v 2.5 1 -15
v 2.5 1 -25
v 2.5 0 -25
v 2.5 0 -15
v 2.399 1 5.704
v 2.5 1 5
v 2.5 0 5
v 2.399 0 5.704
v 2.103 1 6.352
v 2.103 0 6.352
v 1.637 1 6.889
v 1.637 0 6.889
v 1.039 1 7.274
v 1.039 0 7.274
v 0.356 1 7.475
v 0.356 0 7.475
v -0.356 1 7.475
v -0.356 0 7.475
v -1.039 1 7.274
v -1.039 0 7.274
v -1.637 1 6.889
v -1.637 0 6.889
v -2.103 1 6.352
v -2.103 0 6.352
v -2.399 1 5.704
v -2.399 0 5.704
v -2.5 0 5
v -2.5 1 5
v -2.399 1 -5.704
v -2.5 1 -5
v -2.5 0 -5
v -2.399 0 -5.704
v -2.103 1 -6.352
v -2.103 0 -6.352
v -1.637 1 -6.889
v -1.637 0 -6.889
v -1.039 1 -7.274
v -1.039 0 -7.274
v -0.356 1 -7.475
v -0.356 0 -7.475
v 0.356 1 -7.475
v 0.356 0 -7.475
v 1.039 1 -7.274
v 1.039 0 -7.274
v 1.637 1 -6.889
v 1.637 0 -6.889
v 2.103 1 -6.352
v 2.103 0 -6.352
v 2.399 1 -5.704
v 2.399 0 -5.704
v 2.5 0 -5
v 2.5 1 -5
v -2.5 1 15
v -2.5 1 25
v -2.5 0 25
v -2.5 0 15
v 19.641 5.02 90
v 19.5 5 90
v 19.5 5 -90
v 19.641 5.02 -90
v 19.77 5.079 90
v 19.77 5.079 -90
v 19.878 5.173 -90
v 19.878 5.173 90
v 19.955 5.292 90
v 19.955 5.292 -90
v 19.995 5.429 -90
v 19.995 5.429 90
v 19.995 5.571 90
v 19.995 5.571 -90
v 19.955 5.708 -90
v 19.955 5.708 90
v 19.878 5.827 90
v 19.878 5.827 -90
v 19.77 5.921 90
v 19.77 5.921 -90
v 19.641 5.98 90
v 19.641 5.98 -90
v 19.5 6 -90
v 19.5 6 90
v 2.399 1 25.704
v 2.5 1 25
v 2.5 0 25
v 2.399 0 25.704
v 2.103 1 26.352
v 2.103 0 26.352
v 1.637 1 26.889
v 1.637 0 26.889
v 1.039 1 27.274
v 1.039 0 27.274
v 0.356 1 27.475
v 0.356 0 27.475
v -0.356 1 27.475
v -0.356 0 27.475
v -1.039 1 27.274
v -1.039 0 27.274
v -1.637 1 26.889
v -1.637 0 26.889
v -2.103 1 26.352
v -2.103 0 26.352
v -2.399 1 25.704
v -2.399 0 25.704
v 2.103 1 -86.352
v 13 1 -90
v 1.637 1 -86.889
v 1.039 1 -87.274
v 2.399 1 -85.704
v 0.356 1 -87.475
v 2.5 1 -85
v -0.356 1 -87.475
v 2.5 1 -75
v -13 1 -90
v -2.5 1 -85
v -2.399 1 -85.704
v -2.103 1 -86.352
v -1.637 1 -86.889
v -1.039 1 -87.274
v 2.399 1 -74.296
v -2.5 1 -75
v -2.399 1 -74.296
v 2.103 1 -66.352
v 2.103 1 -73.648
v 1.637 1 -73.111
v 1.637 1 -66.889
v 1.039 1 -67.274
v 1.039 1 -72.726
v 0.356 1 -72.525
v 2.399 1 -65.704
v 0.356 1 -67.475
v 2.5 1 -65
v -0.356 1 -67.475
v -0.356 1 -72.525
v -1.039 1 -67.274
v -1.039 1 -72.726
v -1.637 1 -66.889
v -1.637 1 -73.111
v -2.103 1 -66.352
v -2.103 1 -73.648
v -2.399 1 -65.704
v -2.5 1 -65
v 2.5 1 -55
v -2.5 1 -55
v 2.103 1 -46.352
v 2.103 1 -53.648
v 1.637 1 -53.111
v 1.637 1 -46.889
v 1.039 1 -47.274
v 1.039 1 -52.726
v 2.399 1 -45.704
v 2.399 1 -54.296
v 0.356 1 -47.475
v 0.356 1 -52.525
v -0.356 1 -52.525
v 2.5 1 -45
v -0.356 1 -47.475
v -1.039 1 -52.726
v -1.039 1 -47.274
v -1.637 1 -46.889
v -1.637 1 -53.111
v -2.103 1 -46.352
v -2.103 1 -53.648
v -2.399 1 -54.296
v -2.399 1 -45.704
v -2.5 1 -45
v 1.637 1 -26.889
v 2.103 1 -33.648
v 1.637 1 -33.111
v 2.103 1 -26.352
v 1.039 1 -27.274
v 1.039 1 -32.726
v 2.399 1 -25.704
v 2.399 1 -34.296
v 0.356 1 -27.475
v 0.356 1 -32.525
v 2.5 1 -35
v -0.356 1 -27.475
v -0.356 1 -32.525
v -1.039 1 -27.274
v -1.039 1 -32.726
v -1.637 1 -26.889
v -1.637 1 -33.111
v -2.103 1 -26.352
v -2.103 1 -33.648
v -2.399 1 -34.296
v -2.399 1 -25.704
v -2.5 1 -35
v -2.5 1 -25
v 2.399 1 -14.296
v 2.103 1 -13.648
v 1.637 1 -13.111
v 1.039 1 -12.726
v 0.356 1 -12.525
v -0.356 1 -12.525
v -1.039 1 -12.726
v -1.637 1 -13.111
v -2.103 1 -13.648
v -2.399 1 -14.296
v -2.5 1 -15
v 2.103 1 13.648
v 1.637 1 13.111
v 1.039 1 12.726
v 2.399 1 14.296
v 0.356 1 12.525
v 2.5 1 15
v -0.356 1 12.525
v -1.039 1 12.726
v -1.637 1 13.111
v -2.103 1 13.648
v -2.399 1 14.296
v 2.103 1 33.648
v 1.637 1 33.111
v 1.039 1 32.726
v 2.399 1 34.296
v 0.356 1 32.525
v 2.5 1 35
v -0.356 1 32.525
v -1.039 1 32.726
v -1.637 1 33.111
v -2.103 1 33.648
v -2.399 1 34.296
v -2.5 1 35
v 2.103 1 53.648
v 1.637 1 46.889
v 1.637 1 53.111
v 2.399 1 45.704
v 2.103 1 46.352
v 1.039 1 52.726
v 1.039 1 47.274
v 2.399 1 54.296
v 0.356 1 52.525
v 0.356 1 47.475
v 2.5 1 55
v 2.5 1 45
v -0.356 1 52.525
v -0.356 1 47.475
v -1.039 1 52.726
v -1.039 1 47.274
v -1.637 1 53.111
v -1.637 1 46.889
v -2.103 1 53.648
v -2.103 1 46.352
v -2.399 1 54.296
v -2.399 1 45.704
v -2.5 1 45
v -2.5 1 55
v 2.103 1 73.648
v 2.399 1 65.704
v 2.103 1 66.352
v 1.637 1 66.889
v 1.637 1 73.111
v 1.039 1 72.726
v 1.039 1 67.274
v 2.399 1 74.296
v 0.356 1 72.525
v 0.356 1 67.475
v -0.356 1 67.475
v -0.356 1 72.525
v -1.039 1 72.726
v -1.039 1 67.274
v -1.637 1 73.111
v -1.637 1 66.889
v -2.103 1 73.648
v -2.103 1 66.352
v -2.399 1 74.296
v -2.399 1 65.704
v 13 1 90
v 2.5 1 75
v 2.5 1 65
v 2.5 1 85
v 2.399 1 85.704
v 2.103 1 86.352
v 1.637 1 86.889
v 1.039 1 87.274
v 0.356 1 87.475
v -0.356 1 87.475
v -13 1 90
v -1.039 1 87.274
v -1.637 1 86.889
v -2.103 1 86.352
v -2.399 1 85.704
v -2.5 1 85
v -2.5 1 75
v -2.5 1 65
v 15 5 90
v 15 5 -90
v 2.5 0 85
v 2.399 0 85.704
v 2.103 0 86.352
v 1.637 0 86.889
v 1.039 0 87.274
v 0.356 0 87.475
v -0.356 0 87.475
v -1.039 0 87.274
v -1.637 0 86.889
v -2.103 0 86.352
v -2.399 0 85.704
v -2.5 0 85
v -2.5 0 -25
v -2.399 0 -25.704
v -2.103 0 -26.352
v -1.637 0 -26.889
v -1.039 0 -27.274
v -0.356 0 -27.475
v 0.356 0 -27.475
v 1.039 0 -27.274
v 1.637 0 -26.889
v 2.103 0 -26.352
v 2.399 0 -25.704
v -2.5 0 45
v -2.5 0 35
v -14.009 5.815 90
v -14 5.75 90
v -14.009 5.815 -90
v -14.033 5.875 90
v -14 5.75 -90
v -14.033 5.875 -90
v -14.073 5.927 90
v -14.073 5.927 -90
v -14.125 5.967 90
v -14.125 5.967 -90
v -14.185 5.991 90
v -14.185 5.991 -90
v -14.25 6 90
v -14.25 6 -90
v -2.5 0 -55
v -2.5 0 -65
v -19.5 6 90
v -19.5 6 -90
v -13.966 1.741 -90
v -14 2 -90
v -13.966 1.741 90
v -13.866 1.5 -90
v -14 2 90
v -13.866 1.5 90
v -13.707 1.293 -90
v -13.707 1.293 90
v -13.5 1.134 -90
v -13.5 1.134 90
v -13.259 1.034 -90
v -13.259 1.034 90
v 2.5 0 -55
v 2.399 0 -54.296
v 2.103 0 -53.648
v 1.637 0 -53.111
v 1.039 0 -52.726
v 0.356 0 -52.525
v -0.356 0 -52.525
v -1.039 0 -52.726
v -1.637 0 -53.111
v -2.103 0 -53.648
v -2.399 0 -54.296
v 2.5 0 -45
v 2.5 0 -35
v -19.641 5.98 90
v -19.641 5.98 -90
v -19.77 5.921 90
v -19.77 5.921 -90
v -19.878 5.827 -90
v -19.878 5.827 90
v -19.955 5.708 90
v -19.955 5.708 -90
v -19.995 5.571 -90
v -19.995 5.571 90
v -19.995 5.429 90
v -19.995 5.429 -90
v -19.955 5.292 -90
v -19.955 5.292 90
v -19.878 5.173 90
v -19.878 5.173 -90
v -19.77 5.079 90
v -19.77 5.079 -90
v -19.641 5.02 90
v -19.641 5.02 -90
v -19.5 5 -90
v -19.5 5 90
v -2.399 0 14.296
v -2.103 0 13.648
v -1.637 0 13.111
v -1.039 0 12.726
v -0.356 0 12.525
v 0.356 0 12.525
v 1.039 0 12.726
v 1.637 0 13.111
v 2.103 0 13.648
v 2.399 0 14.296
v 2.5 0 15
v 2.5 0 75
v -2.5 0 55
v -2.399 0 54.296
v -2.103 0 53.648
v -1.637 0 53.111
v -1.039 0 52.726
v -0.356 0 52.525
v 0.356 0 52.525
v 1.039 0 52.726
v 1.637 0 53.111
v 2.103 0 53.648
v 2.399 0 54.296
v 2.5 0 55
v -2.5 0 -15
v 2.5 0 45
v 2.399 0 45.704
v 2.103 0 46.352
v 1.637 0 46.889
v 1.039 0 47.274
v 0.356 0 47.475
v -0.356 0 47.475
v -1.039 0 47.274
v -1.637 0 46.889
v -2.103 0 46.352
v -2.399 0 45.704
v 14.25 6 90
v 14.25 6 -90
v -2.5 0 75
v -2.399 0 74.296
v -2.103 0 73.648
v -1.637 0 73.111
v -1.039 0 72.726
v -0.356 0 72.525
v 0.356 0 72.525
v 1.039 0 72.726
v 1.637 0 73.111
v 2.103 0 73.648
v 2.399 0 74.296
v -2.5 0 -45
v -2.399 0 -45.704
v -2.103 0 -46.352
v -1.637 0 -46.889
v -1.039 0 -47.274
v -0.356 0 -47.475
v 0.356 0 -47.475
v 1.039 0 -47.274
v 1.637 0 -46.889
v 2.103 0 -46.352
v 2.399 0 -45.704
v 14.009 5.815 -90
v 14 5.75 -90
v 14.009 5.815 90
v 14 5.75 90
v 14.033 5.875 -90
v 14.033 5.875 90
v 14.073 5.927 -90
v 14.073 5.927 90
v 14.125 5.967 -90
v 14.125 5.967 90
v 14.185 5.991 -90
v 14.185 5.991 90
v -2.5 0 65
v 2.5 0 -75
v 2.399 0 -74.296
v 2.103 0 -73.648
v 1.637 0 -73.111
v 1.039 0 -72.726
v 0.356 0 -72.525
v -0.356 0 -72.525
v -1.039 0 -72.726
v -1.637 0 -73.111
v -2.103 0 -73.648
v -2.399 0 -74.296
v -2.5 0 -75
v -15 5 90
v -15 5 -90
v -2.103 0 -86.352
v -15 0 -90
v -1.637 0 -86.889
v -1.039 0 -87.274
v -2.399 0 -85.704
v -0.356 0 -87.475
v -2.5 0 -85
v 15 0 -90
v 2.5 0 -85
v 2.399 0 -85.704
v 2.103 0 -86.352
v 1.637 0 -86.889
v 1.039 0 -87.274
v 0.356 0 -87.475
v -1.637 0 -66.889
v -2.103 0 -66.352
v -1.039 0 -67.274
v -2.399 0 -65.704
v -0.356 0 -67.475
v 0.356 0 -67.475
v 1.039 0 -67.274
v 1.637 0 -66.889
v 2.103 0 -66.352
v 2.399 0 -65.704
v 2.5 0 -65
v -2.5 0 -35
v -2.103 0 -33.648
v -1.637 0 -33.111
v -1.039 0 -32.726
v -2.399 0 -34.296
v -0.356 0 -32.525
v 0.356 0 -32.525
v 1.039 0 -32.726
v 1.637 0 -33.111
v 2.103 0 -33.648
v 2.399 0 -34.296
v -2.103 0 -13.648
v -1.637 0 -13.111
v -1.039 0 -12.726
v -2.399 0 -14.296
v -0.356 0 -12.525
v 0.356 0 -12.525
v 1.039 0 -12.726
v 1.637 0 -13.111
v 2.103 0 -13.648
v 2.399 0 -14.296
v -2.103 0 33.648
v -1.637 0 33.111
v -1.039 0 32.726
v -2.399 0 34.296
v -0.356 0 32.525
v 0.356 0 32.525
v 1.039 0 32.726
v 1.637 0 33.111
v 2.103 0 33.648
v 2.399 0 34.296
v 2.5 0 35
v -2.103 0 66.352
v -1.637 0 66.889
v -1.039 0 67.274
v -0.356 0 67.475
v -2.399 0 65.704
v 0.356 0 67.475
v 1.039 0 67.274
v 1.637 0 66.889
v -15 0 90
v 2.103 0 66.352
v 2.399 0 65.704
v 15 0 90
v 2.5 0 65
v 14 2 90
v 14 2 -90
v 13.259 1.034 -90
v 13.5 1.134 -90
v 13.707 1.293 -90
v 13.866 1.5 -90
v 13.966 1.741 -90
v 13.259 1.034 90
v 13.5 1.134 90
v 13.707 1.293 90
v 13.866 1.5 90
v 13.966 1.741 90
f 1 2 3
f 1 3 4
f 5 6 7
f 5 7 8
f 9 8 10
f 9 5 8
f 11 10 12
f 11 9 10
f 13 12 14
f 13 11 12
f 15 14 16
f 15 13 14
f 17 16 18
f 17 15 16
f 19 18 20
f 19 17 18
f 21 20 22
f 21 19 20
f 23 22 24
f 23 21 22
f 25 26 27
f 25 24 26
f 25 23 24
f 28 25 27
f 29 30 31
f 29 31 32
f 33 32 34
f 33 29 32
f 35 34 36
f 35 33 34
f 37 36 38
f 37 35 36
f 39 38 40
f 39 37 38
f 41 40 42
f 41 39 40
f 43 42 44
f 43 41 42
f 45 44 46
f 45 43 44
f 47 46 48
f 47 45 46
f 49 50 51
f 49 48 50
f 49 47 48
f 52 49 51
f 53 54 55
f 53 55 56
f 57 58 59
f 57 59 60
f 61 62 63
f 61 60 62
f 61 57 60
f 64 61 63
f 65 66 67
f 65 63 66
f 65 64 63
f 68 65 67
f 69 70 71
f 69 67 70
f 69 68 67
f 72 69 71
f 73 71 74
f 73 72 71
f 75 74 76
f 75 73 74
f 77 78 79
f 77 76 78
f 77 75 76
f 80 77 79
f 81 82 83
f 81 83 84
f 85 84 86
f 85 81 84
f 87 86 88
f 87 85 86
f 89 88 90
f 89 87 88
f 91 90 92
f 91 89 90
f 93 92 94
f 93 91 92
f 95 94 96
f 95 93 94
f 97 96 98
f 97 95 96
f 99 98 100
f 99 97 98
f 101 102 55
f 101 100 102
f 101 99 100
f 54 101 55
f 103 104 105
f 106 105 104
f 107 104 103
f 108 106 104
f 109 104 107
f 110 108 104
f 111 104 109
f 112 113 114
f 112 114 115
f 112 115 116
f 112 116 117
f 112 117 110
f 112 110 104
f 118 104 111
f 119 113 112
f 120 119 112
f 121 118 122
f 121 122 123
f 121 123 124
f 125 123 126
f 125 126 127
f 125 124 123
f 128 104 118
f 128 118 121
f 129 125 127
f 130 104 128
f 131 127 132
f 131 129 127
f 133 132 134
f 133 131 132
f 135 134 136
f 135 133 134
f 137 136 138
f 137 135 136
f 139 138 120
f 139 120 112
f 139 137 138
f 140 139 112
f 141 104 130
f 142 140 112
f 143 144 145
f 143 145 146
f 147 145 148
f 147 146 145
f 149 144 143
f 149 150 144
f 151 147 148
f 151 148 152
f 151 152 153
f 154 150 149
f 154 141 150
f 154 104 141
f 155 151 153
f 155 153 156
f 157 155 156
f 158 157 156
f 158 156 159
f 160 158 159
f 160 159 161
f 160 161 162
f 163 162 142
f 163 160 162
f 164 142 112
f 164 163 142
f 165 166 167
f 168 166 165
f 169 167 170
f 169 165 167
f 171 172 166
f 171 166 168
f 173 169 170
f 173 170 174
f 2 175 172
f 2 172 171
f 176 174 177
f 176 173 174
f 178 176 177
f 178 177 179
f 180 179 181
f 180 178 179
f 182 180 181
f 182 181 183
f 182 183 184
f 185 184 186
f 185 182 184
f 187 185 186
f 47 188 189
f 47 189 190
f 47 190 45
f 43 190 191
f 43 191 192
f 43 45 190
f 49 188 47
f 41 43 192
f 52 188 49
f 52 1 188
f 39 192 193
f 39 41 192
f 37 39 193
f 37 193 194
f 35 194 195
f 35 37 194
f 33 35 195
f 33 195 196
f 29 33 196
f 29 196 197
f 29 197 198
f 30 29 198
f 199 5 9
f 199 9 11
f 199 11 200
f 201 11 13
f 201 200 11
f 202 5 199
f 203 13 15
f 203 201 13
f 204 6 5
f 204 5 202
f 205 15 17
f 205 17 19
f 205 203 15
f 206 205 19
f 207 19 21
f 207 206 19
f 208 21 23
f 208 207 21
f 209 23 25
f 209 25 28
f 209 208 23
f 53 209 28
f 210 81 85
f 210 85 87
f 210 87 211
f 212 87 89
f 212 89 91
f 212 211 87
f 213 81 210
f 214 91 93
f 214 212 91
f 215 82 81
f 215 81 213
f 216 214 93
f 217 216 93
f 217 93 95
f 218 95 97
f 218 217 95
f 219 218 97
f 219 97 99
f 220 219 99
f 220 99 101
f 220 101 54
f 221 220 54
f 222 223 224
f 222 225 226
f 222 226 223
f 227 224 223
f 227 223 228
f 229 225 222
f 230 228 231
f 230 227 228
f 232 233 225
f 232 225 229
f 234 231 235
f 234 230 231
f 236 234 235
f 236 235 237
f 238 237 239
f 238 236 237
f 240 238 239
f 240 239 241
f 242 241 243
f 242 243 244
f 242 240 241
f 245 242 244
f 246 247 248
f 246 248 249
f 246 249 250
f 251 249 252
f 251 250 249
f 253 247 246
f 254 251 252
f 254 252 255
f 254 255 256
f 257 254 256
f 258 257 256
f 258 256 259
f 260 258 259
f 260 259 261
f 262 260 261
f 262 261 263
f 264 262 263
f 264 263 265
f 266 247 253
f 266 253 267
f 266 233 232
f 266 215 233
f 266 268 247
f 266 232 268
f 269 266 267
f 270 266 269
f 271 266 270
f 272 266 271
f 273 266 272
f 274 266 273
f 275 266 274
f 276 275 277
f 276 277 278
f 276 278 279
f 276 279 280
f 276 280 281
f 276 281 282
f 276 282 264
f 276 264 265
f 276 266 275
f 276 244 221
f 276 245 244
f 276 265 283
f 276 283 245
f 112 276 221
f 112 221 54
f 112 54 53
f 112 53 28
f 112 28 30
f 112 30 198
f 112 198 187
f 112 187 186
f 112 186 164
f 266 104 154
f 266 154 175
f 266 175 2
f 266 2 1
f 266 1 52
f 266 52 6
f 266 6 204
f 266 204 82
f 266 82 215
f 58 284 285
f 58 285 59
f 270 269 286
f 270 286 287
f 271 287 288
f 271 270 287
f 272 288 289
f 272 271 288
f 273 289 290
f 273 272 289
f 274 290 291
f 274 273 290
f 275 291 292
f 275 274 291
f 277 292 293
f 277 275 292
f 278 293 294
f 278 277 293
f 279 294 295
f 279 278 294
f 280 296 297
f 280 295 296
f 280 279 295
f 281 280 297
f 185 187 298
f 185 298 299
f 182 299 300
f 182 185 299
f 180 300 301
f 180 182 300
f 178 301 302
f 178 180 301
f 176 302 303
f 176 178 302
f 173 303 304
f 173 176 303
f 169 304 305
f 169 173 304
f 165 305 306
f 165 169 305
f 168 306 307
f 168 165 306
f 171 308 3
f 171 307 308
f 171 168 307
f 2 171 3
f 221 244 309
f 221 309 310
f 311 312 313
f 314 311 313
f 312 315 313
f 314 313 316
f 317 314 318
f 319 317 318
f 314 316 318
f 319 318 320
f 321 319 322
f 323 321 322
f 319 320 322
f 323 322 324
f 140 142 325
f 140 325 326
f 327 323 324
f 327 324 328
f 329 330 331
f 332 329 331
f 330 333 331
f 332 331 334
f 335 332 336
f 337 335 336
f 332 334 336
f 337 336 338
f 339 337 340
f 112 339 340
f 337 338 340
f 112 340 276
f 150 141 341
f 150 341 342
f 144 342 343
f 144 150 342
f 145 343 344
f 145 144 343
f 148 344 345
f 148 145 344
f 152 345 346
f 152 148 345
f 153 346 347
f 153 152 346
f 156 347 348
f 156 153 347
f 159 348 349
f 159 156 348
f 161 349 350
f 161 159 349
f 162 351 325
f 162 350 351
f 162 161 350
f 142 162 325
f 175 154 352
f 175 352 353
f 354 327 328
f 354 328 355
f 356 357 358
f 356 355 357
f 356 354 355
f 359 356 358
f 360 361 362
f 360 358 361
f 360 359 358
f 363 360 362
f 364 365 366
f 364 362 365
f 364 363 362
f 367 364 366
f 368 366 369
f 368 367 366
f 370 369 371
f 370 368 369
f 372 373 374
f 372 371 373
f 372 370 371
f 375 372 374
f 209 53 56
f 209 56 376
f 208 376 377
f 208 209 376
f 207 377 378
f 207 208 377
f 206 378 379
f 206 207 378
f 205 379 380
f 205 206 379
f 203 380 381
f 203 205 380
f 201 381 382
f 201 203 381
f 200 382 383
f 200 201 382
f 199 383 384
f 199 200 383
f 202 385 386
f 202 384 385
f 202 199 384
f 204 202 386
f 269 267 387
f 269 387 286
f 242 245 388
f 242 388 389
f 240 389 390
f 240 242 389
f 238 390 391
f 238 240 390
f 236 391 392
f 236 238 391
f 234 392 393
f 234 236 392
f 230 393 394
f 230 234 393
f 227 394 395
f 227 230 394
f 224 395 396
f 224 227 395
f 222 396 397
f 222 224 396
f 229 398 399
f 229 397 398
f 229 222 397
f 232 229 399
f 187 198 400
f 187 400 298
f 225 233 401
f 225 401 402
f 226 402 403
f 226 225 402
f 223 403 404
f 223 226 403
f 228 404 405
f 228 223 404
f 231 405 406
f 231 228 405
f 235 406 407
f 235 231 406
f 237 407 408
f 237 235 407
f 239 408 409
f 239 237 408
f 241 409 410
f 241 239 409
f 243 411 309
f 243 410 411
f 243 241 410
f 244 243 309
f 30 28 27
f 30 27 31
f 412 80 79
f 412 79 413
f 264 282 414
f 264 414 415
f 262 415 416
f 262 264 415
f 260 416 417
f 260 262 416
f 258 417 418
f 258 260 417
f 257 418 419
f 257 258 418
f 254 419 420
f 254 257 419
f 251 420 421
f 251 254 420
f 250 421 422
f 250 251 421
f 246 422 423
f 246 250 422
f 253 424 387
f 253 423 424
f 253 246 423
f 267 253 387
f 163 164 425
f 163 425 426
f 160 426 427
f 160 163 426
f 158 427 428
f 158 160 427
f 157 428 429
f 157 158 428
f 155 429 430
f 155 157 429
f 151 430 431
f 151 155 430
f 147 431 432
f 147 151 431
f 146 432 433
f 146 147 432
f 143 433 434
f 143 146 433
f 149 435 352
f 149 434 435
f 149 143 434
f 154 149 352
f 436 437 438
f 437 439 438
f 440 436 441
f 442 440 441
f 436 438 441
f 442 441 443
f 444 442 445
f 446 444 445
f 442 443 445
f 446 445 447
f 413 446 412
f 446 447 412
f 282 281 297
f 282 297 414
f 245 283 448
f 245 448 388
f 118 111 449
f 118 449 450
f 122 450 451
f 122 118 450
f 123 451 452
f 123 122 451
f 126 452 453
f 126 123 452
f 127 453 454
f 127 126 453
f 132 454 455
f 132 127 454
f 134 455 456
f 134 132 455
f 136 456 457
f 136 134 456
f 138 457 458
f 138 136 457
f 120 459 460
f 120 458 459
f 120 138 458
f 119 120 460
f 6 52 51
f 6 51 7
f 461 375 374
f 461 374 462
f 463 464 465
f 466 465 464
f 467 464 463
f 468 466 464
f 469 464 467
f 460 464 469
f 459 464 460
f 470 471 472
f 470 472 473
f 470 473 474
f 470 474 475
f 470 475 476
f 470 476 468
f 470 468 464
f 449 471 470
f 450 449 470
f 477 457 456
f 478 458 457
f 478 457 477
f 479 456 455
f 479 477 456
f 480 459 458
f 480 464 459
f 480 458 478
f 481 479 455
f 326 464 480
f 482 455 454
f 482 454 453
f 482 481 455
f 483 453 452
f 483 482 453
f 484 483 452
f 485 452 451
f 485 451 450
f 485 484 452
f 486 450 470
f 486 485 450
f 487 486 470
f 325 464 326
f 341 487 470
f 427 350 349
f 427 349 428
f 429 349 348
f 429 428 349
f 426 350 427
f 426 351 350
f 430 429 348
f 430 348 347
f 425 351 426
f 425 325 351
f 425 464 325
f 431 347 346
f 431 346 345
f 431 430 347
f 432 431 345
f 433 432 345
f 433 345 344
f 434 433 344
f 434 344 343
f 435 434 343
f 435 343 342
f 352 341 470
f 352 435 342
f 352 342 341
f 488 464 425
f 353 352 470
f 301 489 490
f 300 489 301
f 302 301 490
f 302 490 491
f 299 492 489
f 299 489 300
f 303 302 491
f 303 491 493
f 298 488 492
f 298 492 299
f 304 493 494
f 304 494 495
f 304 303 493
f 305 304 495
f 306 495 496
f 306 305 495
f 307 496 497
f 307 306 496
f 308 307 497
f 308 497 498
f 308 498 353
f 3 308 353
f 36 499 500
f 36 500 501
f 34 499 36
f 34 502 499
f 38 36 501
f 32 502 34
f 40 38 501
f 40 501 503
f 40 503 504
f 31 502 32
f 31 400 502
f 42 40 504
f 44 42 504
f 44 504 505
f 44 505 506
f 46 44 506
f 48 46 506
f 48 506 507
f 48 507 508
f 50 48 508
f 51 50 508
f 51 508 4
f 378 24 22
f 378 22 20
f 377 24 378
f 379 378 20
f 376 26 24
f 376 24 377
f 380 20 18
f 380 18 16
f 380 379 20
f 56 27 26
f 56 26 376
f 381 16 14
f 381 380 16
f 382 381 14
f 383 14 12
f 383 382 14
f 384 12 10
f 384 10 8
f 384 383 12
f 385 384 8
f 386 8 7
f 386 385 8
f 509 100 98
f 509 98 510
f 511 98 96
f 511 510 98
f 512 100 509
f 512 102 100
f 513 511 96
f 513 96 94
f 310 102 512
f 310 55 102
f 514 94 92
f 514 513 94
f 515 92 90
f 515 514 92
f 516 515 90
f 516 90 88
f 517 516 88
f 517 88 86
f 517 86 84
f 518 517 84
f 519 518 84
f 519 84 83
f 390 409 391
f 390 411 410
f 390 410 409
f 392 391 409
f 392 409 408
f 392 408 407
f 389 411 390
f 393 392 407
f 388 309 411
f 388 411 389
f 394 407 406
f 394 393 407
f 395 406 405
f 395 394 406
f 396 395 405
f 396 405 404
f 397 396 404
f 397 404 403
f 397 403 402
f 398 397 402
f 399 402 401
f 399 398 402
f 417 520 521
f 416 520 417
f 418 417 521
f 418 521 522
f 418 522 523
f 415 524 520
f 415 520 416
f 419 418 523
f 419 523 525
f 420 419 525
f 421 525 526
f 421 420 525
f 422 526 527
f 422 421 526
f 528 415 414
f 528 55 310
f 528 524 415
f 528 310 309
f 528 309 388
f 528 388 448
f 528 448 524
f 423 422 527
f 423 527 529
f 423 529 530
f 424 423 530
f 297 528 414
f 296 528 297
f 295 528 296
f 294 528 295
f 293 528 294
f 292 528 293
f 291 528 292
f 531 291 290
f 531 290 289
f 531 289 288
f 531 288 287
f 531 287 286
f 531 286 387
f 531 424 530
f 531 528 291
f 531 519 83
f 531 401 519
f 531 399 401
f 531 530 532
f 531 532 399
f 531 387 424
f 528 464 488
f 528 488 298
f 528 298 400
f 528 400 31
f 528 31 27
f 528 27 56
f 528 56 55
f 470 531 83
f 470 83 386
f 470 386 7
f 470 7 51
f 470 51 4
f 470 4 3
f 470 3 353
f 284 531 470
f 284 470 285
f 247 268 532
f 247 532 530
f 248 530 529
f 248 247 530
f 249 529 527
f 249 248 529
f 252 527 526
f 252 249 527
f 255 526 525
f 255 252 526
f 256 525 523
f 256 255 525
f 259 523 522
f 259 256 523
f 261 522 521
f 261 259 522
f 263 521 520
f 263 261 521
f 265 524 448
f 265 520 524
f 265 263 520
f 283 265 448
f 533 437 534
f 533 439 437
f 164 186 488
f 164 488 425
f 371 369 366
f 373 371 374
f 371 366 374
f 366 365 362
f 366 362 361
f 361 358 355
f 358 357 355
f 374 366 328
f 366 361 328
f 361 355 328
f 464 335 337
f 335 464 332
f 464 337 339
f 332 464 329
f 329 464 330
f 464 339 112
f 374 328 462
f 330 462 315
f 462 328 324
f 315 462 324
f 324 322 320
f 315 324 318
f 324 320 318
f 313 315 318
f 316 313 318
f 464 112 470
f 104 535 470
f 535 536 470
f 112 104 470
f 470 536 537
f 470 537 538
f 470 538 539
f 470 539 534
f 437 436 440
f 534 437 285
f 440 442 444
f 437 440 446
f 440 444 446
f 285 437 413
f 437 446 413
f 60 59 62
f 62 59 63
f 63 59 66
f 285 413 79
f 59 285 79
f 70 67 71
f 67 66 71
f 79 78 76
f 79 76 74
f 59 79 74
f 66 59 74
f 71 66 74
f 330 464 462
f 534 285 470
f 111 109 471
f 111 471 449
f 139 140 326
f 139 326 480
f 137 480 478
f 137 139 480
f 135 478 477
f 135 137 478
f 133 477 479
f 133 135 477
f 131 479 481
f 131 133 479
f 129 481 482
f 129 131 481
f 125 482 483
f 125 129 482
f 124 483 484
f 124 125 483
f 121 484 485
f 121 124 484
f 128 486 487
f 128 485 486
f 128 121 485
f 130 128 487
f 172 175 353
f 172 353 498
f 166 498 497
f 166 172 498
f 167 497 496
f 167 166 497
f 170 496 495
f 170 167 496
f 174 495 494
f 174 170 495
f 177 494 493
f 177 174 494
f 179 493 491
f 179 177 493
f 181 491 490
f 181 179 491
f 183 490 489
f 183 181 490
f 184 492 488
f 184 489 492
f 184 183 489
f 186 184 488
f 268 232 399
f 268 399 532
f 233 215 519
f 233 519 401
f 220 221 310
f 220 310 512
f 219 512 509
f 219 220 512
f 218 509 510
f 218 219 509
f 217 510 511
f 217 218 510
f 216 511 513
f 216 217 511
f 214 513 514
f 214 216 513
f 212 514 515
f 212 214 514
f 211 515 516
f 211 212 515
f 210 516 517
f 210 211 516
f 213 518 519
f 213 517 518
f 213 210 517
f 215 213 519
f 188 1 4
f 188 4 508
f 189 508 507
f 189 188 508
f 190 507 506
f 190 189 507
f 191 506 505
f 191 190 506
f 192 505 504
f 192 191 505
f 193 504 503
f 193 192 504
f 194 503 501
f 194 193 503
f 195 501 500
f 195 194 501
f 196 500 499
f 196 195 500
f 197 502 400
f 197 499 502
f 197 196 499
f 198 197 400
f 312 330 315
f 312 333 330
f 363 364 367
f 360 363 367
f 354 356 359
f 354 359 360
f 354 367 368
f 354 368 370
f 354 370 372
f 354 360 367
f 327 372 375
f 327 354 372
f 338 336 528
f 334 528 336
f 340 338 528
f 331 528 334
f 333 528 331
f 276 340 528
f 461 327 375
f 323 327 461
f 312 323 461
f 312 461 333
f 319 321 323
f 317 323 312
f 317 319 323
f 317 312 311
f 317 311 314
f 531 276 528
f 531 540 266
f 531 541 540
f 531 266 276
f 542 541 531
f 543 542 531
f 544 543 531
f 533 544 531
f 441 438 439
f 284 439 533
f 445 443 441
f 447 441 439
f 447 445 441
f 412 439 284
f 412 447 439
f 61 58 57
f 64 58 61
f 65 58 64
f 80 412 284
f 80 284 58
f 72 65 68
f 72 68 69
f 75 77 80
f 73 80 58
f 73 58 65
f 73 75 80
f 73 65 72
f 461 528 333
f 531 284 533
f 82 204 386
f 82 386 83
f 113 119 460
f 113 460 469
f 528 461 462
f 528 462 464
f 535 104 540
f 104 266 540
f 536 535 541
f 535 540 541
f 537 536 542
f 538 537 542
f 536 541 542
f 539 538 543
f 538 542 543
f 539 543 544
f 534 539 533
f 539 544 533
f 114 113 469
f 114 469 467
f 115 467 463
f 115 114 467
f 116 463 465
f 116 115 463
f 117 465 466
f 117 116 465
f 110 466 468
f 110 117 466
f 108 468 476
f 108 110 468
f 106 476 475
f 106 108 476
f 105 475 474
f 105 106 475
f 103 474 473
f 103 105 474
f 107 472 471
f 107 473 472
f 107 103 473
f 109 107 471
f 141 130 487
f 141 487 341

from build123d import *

# Parameters (mm, degrees)
EXTRUDE_THIN1_DEPTH = 90
FILLET1_R           = 1
FILLET2_R           = 0.25
FILLET3_RADIUS      = 0.5
FILLET3_LENGTH      = 180
FILLET4_RADIUS      = 0.5
FILLET4_LENGTH      = 180
CUT_EXTRUDE1_DEPTH  = 93.330926563
LPATTERN1_COUNT     = 5
LPATTERN1_PITCH     = 20
LPATTERN1_COL_COUNT = 5
LPATTERN1_COL_PITCH = 20


with BuildPart() as part:
    # Sketch1 → Extrude-Thin1 (new, symmetric)
    with BuildSketch(Plane.XY):
        Polygon((-20, 5), (-15, 5), (-15, 0), (15, 0), (15, 5), (20, 5), (20, 6), (14, 6), (14, 1), (-14, 1), (-14, 6), (-20, 6), align=None)
    extrude(amount=EXTRUDE_THIN1_DEPTH, both=True)

    # Fillet1
    fillet1_edges = [part.edges().sort_by_distance(p)[0] for p in [
        (-14, 1, 0),
        (14, 1, 0),
    ]]
    fillet(fillet1_edges, radius=FILLET1_R)

    # Fillet2
    fillet2_edges = [part.edges().sort_by_distance(p)[0] for p in [
        (-14, 6, 0),
        (14, 6, 0),
    ]]
    fillet(fillet2_edges, radius=FILLET2_R)

    # Fillet3: full round fillet: the end face becomes a half cylinder, R = half its width
    fillet3_face = Plane((20, 5.5, 0), x_dir=(0, 0, 1), z_dir=(1, 0, 0))  # on the end face: x along it, z out of the body
    fillet3_slab = fillet3_face.offset(-FILLET3_RADIUS / 2) * Box(FILLET3_LENGTH, 2 * FILLET3_RADIUS, FILLET3_RADIUS, mode=Mode.PRIVATE)  # the body's end, R deep
    fillet3_round = Plane((19.5, 5.5, 0), x_dir=(1, 0, 0), z_dir=(0, 0, 1)) * Cylinder(FILLET3_RADIUS, FILLET3_LENGTH, mode=Mode.PRIVATE)  # its axis R under the face
    add(fillet3_slab - fillet3_round, mode=Mode.SUBTRACT)

    # Fillet4: full round fillet: the end face becomes a half cylinder, R = half its width
    fillet4_face = Plane((-20, 5.5, 0), x_dir=(0, 0, 1), z_dir=(-1, 0, 0))  # on the end face: x along it, z out of the body
    fillet4_slab = fillet4_face.offset(-FILLET4_RADIUS / 2) * Box(FILLET4_LENGTH, 2 * FILLET4_RADIUS, FILLET4_RADIUS, mode=Mode.PRIVATE)  # the body's end, R deep
    fillet4_round = Plane((-19.5, 5.5, 0), x_dir=(-1, 0, 0), z_dir=(0, 0, 1)) * Cylinder(FILLET4_RADIUS, FILLET4_LENGTH, mode=Mode.PRIVATE)  # its axis R under the face
    add(fillet4_slab - fillet4_round, mode=Mode.SUBTRACT)

    # Sketch2 → Cut-Extrude1 (cut, through all)
    with BuildSketch(Plane(origin=(0, 1, 0), x_dir=(1, 0, 0), z_dir=(0, 1, 0))):
        with BuildLine():
            Line((-2.5, -5), (-2.5, 5))
            ThreePointArc((-2.5, 5), (0, 7.5), (2.5, 5))
            Line((2.5, 5), (2.5, -5))
            ThreePointArc((2.5, -5), (0, -7.5), (-2.5, -5))
        make_face()
    cut_extrude1 = extrude(amount=-CUT_EXTRUDE1_DEPTH, mode=Mode.SUBTRACT)

    # LPattern1: Cut-Extrude1 ×5
    with Locations(*[(0, 0, -i * LPATTERN1_PITCH) for i in range(1, LPATTERN1_COUNT)]):
        add(cut_extrude1, mode=Mode.SUBTRACT)

    # LPattern1 col: Cut-Extrude1 ×5
    with Locations(*[(0, 0, i * LPATTERN1_COL_PITCH) for i in range(1, LPATTERN1_COL_COUNT)]):
        add(cut_extrude1, mode=Mode.SUBTRACT)


solid = part.part
